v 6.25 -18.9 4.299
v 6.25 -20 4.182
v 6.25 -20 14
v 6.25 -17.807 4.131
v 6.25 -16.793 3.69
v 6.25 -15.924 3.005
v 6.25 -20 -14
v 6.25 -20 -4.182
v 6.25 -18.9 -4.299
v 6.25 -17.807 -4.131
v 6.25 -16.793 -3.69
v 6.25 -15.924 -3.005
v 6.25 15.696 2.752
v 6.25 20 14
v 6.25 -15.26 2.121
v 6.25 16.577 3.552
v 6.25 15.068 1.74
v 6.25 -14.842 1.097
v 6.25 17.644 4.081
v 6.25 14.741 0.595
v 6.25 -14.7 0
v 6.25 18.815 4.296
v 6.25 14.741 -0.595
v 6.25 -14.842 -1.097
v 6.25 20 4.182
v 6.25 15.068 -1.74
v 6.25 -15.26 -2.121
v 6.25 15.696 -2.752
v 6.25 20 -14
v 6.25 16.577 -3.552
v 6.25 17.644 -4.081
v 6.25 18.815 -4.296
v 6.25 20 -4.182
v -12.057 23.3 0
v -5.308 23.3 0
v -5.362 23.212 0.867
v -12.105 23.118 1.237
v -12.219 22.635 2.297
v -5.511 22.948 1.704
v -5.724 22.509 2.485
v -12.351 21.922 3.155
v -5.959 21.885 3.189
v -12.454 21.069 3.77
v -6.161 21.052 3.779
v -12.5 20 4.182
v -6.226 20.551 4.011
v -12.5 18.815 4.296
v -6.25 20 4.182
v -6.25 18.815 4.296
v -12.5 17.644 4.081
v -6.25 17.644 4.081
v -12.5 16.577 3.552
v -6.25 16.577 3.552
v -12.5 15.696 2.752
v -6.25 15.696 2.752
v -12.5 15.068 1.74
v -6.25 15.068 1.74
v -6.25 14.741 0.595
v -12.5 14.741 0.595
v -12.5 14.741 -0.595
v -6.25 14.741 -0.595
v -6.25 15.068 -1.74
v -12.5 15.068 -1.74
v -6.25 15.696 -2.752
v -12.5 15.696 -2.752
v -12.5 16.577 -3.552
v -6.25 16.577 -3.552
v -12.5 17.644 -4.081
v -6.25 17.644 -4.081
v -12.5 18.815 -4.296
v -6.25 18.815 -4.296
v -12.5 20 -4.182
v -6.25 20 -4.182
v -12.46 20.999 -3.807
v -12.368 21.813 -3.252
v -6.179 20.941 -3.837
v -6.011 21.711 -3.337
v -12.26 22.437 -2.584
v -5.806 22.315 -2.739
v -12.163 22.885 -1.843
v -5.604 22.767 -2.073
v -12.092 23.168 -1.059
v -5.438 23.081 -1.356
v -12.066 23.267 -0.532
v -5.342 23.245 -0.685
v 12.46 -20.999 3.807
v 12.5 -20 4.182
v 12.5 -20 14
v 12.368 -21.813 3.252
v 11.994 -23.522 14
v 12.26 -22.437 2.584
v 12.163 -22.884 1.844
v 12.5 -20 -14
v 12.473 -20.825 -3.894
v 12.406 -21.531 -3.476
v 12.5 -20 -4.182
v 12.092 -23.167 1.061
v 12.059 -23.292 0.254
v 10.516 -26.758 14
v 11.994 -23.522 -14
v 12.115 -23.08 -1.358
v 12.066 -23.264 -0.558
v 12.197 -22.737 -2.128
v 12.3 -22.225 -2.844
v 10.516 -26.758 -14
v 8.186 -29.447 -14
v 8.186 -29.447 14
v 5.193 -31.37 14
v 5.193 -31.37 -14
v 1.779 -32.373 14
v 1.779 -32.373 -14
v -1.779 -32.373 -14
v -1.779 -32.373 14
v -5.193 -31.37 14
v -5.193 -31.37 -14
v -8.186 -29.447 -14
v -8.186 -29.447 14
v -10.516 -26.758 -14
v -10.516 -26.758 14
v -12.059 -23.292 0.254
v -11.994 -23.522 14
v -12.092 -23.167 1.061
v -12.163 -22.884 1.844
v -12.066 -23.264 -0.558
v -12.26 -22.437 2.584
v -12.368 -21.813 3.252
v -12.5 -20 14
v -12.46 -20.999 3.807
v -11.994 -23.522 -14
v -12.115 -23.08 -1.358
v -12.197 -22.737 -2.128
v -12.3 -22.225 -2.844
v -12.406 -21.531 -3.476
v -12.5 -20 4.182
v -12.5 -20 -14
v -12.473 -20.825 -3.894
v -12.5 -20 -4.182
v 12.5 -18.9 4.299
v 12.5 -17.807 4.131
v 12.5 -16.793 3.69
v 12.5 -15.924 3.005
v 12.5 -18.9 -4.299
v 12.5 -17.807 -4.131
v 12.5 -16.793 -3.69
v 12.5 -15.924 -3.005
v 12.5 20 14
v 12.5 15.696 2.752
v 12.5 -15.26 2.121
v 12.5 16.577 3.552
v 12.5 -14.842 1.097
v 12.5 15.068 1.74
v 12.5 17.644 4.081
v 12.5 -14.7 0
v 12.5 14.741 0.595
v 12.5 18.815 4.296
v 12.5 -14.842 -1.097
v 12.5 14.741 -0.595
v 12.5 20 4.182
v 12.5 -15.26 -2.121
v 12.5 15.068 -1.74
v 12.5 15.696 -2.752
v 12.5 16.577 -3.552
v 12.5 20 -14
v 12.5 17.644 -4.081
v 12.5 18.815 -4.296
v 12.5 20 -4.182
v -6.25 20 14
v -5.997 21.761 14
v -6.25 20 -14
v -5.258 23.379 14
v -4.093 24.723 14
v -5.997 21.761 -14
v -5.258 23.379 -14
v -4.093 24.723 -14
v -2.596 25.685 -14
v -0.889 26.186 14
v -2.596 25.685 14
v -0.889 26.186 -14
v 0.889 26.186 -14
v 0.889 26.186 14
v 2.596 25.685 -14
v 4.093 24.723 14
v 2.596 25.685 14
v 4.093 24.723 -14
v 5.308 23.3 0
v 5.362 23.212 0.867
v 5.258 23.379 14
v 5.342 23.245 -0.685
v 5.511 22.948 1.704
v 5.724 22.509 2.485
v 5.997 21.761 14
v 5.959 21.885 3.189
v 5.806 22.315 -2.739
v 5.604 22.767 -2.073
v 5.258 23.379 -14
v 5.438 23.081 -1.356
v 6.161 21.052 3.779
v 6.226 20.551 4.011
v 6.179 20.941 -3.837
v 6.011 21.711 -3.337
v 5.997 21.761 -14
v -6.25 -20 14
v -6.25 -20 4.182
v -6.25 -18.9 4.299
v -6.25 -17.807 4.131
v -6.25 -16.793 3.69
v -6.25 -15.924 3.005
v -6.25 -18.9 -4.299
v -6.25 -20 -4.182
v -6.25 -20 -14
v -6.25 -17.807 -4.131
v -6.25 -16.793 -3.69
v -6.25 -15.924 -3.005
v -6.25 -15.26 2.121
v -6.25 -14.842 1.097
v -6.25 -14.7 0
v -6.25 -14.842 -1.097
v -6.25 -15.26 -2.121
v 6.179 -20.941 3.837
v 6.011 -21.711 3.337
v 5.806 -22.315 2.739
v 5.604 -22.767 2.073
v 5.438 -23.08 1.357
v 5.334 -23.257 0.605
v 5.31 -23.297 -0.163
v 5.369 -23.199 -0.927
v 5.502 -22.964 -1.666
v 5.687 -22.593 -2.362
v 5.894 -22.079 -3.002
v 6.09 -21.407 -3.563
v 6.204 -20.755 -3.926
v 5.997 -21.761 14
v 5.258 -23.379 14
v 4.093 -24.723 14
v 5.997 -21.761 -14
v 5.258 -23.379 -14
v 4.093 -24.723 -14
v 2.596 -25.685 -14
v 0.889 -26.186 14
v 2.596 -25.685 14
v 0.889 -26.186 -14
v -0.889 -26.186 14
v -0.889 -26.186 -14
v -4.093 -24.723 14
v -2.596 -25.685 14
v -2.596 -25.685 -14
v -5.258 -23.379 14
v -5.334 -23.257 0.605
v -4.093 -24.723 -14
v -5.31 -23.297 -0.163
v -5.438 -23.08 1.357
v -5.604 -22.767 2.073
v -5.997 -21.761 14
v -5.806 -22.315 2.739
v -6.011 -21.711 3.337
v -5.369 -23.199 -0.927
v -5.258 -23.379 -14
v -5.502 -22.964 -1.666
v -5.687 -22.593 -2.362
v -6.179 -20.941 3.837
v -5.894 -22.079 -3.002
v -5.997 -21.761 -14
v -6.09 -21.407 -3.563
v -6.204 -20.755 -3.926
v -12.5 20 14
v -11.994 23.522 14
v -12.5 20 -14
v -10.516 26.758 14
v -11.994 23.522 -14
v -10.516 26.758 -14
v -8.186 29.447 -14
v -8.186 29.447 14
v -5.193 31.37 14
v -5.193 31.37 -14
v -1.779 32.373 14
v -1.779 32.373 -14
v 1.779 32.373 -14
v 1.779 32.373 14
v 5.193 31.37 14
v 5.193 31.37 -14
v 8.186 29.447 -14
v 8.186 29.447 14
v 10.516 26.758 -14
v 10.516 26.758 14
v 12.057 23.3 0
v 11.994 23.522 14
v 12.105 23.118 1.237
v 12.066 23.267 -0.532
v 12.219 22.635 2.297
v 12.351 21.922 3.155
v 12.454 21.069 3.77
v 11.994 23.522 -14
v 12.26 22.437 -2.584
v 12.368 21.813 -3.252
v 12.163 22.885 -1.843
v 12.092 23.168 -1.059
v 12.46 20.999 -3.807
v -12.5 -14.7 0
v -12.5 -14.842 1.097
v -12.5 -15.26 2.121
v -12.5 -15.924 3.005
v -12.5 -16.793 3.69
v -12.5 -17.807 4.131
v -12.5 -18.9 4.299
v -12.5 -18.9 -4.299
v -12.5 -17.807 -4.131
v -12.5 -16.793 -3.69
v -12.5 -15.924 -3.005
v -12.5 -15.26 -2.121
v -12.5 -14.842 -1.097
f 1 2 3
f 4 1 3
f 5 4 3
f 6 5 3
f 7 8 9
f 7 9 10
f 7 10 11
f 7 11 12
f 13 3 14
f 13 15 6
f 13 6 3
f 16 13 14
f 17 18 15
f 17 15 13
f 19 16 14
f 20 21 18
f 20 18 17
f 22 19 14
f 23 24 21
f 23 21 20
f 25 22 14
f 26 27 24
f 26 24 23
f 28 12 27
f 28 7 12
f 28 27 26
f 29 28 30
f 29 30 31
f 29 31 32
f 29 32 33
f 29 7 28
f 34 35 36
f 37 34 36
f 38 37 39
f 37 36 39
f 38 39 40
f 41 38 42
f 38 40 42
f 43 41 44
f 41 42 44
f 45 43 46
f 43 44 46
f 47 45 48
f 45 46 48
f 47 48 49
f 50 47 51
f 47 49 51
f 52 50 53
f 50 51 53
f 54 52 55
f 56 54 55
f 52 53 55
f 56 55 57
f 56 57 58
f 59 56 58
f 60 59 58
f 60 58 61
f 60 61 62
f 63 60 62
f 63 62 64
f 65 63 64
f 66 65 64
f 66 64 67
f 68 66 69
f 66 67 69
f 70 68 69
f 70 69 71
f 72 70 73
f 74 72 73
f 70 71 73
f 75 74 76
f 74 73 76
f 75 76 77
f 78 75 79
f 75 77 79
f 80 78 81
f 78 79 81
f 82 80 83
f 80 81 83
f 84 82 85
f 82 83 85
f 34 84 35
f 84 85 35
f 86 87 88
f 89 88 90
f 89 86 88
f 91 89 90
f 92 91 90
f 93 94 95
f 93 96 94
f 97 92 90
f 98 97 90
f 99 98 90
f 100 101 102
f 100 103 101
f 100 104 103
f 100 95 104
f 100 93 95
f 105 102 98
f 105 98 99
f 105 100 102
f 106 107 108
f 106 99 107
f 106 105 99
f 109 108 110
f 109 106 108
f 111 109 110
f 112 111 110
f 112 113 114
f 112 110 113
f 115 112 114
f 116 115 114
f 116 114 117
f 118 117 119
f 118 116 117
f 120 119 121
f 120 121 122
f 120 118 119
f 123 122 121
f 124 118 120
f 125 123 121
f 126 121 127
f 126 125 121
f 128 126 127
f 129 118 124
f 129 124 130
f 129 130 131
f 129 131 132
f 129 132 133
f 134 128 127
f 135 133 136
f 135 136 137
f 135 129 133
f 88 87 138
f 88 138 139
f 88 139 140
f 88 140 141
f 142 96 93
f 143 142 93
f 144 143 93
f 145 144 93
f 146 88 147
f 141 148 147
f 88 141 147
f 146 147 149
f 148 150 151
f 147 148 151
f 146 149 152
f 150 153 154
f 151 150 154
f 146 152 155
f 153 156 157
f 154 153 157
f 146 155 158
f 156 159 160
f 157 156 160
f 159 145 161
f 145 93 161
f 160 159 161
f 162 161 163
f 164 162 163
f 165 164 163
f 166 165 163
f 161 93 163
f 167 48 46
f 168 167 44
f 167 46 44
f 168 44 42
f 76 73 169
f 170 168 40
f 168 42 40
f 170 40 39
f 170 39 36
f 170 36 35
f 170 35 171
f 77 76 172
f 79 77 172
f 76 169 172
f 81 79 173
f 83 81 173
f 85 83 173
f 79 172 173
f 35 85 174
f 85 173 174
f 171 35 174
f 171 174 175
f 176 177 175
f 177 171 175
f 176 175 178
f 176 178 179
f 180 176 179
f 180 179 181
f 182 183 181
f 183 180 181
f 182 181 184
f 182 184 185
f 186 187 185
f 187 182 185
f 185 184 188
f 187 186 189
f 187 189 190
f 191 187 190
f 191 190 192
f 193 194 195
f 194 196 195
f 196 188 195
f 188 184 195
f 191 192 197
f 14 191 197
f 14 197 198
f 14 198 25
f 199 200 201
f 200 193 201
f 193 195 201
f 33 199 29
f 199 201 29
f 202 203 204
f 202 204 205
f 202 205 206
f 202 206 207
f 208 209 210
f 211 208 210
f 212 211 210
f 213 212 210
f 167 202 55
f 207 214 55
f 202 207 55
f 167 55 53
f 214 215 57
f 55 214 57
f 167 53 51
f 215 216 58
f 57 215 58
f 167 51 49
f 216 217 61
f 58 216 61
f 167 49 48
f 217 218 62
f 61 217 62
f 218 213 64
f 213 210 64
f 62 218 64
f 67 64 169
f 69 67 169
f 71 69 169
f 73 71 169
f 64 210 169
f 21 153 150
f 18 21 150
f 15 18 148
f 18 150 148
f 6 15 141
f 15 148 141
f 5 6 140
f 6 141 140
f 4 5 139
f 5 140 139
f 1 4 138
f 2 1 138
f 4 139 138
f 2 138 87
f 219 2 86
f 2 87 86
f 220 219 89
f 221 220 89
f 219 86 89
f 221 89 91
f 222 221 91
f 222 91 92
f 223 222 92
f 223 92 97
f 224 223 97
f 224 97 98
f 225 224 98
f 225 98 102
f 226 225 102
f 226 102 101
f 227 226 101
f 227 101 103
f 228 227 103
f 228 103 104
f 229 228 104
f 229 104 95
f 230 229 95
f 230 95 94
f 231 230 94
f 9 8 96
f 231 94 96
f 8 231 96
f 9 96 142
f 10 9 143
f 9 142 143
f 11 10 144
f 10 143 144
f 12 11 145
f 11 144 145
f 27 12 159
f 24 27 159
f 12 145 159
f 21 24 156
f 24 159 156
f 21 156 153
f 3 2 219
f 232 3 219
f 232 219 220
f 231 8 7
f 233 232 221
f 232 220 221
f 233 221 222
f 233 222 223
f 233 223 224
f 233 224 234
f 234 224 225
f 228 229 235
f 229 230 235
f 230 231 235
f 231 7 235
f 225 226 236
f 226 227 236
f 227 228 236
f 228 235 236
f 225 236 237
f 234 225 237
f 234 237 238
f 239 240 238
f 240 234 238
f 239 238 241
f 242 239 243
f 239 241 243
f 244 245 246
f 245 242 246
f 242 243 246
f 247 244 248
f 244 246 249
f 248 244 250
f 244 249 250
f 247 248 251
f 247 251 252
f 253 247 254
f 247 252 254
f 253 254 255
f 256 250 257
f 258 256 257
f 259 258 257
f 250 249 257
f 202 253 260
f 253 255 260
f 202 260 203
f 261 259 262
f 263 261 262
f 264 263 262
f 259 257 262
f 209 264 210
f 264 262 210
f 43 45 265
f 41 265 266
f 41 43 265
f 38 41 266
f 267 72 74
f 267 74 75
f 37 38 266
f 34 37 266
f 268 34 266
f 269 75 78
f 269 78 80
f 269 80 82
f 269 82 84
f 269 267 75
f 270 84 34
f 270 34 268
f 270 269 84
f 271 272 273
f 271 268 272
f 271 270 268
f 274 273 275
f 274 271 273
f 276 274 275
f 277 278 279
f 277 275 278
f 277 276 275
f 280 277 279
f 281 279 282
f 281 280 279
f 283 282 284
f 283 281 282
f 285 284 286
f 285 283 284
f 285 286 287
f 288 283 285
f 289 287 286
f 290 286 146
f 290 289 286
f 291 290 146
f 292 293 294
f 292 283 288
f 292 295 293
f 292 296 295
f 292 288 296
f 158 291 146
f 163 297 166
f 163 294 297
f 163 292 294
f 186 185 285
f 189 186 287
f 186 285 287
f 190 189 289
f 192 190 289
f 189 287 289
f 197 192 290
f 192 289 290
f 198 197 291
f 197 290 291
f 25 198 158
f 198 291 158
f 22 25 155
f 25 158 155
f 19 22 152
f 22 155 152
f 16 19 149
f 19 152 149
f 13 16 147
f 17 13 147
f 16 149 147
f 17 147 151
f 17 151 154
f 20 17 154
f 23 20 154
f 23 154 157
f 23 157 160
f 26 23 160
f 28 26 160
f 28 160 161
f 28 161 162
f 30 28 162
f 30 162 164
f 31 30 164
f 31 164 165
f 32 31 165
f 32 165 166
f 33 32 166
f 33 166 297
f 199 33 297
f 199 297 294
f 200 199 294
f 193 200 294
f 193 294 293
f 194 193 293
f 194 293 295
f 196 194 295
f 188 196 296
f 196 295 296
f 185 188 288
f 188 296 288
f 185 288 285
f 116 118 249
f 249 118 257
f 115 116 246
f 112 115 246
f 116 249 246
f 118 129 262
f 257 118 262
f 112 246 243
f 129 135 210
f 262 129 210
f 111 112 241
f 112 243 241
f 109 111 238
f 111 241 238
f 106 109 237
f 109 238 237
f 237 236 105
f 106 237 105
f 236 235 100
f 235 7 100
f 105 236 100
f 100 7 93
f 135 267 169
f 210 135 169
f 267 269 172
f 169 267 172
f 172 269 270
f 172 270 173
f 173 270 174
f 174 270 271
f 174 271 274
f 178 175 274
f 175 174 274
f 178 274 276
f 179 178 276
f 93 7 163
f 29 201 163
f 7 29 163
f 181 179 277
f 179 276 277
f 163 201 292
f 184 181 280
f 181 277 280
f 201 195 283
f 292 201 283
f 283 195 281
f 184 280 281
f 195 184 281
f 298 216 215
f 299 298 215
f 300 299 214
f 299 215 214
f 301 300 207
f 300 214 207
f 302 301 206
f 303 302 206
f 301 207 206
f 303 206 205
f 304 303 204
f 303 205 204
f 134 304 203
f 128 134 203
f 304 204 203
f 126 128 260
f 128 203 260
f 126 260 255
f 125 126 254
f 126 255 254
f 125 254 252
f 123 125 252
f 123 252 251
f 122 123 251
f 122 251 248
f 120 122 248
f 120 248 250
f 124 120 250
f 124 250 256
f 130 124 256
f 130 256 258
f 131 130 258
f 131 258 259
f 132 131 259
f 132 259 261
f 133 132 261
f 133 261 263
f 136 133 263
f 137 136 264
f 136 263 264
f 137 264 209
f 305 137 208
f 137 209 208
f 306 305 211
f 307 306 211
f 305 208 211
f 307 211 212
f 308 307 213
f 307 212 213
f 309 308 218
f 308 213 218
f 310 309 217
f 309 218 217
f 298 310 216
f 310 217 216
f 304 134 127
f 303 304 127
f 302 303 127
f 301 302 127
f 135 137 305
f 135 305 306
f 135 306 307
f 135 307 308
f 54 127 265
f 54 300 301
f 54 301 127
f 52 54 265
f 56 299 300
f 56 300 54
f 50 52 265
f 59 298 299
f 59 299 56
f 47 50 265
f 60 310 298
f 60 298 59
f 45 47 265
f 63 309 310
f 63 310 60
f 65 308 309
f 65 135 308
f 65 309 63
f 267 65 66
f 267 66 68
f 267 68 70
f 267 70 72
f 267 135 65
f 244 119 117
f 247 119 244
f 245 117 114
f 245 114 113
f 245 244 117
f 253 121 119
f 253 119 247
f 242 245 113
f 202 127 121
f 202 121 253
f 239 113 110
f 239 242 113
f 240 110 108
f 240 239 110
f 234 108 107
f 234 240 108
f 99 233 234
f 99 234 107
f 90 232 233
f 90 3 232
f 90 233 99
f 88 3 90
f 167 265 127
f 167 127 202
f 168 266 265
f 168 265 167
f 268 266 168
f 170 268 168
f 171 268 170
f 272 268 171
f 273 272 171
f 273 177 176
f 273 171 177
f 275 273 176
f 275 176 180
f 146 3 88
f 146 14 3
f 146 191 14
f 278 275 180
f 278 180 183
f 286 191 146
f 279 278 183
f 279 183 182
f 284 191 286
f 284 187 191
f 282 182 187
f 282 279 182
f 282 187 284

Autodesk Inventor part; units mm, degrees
ref_plane "XZ Plane" through (0, 0, 0) normal (0, 1, 0) x (-1, 0, 0)
ref_plane "XY Plane" through (0, 0, 0) normal (0, 0, 1) x (1, 0, 0)
sketch "Sketch1" plane through (0, 0, 0) normal (0, 0, 1) x (1, 0, 0)
  line L0 (-12.5, -20) -> (-12.5, 20)
  arc A0 (12.5, 20) -> (-12.5, 20) centre (0, 20) ccw
  arc A1 (-12.5, -20) -> (12.5, -20) centre (0, -20) ccw
  line L1 (12.5, -20) -> (12.5, 20)
  arc A2 (6.25, 20) -> (-6.25, 20) centre (0, 20) ccw
  arc A3 (-6.25, -20) -> (6.25, -20) centre (0, -20) ccw
  line L2 (6.25, -20) -> (6.25, 20)
  line L3 (-6.25, -20) -> (-6.25, 20)
  point P0 (0, 0)
  point P1 (12.5, 0)
  dimension "d0" = 40
  dimension "d1" = 12.5
  dimension "d2" = 12.5
extrude "Extrusion1" add sketch "Sketch1" along normal mid plane 28
ref_plane "Work Plane1" through (12.5, 0, 0) normal (1, 0, 0) x (0, 1, 0)
sketch "Sketch2" plane through (12.5, 0, 0) normal (1, 0, 0) x (0, 1, 0)
  line L0 (20, 14) -> (20, -14) construction
  line L1 (-20, 14) -> (20, 14) construction
  line L2 (-20, -14) -> (-20, 14) construction
  line L3 (20, -14) -> (-20, -14) construction
  circle A0 centre (19, 0) radius 4.3
  line L4 (0, 14) -> (0, -14) construction
  line L5 (-20, -14) -> (20, -14) construction
  circle A1 centre (-19, 0) radius 4.3
  point P0 (0, 0)
  point P1 (20, 0)
  dimension "d6" = 8.6
  dimension "d10" = 38
extrude "Extrusion2" cut sketch "Sketch2" against normal blind 28
properties part number "cabeza_obj2"
